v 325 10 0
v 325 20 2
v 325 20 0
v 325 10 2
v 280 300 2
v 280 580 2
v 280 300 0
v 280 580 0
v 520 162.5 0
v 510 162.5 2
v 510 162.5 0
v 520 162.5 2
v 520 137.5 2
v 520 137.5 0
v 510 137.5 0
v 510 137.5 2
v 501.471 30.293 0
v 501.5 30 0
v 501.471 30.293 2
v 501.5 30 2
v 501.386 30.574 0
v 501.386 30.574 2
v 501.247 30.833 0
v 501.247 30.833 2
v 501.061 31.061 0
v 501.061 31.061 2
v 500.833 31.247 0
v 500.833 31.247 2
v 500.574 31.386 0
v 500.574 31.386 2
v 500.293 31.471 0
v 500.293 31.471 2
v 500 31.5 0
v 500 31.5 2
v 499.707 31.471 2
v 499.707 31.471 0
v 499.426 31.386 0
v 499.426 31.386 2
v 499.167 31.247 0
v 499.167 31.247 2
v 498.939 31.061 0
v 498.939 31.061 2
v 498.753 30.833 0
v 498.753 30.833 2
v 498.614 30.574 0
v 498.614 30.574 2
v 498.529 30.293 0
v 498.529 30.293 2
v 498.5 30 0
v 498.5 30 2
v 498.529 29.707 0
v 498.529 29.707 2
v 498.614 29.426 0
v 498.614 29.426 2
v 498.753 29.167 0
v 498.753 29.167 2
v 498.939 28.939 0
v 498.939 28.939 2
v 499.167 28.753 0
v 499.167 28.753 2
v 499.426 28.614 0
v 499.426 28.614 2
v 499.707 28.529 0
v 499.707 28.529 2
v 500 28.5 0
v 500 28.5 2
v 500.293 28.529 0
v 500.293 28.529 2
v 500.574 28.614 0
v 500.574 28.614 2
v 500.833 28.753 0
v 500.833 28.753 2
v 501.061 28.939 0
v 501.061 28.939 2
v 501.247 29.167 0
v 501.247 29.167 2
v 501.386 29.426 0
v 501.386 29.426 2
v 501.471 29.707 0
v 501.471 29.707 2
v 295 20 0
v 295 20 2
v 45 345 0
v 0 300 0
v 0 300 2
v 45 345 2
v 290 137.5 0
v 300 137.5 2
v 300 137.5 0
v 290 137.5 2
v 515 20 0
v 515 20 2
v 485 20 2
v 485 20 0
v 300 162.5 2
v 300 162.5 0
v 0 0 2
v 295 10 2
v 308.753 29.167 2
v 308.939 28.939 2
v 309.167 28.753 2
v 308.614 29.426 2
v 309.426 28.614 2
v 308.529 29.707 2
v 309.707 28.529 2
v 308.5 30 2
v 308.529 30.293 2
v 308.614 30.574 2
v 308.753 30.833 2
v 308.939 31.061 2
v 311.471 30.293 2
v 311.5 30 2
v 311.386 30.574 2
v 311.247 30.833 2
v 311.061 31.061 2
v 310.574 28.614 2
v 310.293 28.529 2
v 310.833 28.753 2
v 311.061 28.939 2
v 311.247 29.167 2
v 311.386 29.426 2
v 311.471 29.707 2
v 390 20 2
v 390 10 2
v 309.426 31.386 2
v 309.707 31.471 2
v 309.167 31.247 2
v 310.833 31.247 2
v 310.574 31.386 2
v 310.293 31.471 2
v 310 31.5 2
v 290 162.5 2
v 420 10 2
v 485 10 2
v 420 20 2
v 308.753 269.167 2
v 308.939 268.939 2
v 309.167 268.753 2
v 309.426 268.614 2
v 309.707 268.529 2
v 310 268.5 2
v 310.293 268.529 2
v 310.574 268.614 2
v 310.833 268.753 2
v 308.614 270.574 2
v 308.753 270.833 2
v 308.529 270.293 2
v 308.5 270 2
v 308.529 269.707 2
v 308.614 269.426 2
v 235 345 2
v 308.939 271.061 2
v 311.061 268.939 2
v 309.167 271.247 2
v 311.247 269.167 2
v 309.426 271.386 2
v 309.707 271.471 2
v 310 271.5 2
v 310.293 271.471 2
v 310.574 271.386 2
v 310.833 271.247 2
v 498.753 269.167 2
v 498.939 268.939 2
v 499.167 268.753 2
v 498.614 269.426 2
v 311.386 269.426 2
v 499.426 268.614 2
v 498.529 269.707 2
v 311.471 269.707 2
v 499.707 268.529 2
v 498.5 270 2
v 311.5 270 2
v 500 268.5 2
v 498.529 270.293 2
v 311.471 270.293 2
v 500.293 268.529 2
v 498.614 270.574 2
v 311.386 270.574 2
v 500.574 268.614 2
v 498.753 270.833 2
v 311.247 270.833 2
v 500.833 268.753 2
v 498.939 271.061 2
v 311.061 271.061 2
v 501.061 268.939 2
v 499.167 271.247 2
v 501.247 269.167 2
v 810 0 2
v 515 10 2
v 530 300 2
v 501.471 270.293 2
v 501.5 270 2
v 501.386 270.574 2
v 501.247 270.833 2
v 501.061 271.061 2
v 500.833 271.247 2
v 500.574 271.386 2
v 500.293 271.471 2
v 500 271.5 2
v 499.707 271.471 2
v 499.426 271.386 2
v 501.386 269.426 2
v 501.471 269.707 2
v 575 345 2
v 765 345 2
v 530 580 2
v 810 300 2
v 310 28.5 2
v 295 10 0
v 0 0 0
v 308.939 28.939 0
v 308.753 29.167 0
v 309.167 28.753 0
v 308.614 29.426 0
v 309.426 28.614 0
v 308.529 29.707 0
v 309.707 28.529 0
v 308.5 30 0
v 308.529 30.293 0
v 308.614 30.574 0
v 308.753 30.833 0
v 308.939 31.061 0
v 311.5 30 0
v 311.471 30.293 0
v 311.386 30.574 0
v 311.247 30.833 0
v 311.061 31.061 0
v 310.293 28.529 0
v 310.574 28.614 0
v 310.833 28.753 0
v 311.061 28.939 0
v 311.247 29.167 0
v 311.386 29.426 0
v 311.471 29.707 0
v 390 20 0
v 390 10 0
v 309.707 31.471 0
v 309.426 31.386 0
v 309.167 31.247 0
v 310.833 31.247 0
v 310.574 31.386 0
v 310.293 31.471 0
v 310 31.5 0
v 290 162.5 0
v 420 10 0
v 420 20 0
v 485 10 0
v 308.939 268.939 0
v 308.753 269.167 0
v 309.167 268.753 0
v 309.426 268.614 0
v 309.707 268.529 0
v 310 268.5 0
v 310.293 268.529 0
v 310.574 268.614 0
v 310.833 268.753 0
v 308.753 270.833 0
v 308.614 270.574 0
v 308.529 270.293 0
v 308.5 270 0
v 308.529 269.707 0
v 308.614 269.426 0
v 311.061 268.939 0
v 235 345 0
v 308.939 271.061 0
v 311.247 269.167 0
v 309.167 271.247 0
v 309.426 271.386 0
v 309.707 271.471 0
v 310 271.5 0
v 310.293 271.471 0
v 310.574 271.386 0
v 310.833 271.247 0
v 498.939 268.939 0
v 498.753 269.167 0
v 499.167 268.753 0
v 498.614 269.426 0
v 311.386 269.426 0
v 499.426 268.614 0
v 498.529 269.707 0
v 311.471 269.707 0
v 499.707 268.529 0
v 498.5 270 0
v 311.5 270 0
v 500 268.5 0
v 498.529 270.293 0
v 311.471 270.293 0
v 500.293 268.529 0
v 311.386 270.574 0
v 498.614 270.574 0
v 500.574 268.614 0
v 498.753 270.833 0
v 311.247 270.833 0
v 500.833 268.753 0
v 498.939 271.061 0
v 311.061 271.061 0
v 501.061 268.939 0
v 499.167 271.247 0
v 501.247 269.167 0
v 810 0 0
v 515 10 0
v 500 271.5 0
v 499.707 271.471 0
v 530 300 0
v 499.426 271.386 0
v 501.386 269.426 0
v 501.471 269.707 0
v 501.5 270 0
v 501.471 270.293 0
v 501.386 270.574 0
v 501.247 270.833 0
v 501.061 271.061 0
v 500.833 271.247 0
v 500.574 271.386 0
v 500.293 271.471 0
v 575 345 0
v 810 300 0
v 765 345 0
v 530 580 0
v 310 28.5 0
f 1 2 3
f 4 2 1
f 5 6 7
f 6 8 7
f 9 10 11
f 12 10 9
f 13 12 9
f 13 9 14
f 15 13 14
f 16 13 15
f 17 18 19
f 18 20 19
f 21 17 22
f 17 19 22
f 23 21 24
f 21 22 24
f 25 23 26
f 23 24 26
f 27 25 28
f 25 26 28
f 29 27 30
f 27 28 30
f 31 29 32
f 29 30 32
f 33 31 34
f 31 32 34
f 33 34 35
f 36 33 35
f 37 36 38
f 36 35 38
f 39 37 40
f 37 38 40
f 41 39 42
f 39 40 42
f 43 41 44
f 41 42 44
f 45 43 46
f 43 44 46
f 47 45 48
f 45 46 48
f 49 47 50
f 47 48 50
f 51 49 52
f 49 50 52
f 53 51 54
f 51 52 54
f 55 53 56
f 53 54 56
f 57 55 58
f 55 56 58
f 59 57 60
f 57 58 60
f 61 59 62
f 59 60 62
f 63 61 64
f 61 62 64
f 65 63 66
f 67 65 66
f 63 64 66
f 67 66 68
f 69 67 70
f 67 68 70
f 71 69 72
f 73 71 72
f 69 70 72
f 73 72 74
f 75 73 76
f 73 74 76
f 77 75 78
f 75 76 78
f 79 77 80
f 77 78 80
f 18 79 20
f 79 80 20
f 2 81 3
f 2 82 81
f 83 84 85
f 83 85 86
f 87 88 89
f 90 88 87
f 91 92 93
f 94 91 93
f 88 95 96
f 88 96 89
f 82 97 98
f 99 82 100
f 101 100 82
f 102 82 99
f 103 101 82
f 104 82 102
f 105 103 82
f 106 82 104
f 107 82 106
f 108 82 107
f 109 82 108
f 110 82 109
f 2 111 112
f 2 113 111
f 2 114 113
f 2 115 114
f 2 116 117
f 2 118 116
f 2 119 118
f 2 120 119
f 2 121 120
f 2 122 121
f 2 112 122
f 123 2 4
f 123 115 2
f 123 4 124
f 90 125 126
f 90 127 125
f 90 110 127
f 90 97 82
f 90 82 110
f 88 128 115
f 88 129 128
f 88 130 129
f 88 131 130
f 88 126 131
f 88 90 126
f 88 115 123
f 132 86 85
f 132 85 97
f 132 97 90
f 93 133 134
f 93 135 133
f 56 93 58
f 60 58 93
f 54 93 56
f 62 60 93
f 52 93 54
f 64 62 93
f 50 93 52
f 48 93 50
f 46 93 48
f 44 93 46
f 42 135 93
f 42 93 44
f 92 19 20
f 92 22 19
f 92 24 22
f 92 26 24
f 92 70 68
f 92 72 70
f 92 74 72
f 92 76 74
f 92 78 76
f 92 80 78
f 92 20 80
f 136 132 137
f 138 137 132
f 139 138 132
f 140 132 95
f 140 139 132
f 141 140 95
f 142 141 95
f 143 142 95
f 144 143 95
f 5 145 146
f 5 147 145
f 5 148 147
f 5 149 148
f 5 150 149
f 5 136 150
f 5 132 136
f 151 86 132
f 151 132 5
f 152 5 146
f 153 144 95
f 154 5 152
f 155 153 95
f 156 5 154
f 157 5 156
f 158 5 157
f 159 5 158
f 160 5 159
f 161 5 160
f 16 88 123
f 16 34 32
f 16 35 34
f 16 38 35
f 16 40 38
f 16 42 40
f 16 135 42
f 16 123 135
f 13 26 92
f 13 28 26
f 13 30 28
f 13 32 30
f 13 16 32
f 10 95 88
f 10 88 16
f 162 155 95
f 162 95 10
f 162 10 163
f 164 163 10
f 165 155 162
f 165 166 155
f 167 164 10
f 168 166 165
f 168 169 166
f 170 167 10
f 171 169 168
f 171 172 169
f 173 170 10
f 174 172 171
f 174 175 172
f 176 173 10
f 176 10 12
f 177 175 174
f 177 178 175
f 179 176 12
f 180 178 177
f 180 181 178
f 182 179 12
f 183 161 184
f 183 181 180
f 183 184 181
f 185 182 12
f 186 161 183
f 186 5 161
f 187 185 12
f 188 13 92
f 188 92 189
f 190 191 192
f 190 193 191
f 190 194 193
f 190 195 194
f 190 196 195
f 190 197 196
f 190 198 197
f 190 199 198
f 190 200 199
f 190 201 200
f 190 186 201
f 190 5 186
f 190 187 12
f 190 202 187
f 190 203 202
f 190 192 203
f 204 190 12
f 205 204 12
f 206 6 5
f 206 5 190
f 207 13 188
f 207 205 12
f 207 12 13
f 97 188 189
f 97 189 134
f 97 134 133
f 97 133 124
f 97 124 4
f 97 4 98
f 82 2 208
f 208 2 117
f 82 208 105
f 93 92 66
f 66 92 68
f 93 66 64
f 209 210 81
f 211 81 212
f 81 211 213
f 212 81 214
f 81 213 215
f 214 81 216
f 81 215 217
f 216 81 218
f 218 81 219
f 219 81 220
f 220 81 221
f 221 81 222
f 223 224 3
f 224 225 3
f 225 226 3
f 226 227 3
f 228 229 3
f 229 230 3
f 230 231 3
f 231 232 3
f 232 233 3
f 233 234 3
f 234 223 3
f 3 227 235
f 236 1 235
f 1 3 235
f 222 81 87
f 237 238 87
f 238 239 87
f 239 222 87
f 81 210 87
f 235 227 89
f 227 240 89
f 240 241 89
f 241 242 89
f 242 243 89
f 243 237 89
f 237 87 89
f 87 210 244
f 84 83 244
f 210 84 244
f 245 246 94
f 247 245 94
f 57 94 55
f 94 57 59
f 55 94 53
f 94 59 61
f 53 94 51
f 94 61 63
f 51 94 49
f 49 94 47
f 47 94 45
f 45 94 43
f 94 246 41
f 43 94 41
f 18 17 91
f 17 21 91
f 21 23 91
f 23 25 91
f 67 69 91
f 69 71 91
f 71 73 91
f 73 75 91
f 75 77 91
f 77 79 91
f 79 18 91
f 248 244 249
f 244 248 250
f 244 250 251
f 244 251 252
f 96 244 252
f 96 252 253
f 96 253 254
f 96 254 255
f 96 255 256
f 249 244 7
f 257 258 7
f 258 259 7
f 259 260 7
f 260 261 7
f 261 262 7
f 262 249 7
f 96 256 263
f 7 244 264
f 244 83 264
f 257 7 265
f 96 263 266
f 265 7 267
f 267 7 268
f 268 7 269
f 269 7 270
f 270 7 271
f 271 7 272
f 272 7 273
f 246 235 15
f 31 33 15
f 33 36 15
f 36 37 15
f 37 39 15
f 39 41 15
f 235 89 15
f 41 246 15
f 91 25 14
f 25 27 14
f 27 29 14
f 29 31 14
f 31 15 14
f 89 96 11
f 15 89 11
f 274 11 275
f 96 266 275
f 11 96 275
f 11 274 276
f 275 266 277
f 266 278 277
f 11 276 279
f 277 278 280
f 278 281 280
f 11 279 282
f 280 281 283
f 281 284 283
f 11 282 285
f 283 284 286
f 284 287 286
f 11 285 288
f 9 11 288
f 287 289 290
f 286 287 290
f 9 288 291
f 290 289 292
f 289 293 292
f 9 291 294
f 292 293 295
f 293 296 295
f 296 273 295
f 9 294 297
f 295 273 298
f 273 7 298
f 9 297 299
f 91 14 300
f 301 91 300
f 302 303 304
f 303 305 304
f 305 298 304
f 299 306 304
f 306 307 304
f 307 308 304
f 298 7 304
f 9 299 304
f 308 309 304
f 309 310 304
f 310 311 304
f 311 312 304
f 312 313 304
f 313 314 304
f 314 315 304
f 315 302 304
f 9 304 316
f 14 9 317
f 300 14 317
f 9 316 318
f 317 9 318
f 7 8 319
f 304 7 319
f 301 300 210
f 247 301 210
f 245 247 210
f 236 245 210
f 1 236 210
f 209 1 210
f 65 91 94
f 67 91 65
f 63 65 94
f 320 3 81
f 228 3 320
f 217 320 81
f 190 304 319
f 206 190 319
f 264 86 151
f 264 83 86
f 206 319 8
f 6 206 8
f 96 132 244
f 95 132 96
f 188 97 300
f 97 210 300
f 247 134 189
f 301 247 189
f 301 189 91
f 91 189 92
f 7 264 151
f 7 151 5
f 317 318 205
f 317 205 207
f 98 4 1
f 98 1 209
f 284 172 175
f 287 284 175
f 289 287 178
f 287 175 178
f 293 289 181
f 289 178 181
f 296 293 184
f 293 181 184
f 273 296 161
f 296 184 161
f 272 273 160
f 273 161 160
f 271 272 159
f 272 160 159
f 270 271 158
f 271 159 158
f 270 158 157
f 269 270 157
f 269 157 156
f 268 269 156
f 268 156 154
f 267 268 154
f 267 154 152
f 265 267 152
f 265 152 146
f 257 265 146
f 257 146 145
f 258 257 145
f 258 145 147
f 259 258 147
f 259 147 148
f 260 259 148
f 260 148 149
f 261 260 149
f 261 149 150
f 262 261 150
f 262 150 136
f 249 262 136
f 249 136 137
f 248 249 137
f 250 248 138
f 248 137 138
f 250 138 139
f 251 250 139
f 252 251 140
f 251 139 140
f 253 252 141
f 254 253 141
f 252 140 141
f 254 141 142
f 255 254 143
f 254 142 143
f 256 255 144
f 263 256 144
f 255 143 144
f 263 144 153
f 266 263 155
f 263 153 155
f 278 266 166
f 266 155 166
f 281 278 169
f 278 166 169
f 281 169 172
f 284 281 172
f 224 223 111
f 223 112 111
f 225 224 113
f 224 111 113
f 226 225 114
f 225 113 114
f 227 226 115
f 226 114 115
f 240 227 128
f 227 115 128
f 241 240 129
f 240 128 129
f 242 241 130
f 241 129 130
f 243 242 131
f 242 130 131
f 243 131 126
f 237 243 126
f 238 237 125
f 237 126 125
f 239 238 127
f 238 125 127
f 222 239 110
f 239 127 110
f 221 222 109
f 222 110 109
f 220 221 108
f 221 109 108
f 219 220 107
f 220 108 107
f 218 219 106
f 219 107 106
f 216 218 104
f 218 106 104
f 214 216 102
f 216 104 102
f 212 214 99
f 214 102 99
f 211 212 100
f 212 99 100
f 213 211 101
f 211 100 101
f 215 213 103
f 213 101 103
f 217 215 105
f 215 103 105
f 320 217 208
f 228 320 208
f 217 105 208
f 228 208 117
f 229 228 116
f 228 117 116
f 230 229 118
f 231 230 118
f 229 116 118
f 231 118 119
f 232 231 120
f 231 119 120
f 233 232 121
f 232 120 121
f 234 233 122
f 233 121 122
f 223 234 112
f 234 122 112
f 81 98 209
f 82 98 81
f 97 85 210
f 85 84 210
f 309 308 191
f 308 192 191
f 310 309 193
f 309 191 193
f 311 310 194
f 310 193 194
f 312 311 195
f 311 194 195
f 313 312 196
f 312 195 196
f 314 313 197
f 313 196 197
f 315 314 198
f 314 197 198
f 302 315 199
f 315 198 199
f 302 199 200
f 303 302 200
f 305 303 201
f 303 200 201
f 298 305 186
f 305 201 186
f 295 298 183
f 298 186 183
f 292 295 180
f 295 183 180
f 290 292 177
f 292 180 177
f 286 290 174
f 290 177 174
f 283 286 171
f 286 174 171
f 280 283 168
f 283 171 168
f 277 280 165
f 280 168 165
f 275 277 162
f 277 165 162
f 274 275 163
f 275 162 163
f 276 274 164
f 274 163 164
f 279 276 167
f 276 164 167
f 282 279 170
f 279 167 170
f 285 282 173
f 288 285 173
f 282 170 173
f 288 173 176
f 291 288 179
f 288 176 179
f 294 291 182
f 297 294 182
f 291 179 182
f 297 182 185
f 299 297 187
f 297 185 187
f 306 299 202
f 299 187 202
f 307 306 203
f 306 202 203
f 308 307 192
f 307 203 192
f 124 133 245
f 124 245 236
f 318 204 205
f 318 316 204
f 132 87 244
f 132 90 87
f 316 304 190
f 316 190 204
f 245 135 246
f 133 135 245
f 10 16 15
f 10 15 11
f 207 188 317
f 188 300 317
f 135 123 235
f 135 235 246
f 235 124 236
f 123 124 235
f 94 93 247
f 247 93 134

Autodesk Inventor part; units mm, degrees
ref_plane "YZ Plane" through (0, 0, 0) normal (1, 0, 0) x (0, 1, 0)
ref_plane "XZ Plane" through (0, 0, 0) normal (0, 1, 0) x (-1, 0, 0)
ref_plane "XY Plane" through (0, 0, 0) normal (0, 0, 1) x (1, 0, 0)
sketch "Эскиз1" plane through (0, 0, 0) normal (0, 0, 1) x (1, 0, 0)
  line L0 (0, 0) -> (810, 0)
  line L1 (810, 0) -> (810, 300)
  line L2 (810, 300) -> (0, 300)
  line L3 (0, 300) -> (0, 0)
  line L4 (280, 300) -> (530, 300) construction
  line L5 (530, 300) -> (530, 0) construction
  line L6 (530, 0) -> (280, 0) construction
  line L7 (280, 0) -> (280, 300) construction
  line L8 (280, 300) -> (530, 300)
  line L9 (530, 300) -> (530, 580)
  line L10 (530, 580) -> (280, 580)
  line L11 (280, 580) -> (280, 300)
  line L12 (0, 300) -> (45, 345)
  line L13 (45, 345) -> (235, 345)
  line L14 (235, 345) -> (280, 300)
  line L15 (530, 300) -> (575, 345)
  line L16 (575, 345) -> (765, 345)
  line L17 (765, 345) -> (810, 300)
  dimension "d0" = 300
  dimension "d1" = 810
  dimension "d2" = 250
  dimension "d3" = 280
  dimension "d4" = 280
  dimension "d5" = 280
  dimension "d6" = 45
extrude "Выдавливание1" add sketch "Эскиз1" along normal blind 2
sketch "Эскиз2" plane through (0, 0, 2) normal (0, 0, 1) x (1, 0, 0)
  line L0 (45, 345) -> (0, 300) projected
  line L1 (0, 300) -> (0, 0) projected
  line L2 (0, 0) -> (810, 0) projected
  line L3 (810, 0) -> (810, 300) projected
  line L4 (810, 300) -> (765, 345) projected
  line L5 (765, 345) -> (575, 345) projected
  line L6 (575, 345) -> (530, 300) projected
  line L7 (530, 300) -> (530, 580) projected
  line L8 (530, 580) -> (280, 580) projected
  line L9 (280, 580) -> (280, 300) projected
  line L10 (280, 300) -> (235, 345) projected
  line L11 (235, 345) -> (45, 345) projected
  line L12 (280, 300) -> (530, 300) construction
  line L13 (530, 300) -> (530, 0) construction
  line L14 (530, 0) -> (280, 0) construction
  line L15 (280, 0) -> (280, 300) construction
  line L16 (530, 300) -> (530, 580) construction
  circle A0 centre (310, 270) radius 1.5
  circle A1 centre (500, 270) radius 1.5
  circle A2 centre (310, 30) radius 1.5
  circle A3 centre (500, 30) radius 1.5
  line L17 (500, 270) -> (310, 270) construction
  line L18 (310, 270) -> (310, 30) construction
  line L19 (310, 30) -> (500, 30) construction
  line L20 (500, 30) -> (500, 270) construction
  line L21 (290, 162.5) -> (300, 162.5)
  line L22 (300, 162.5) -> (300, 137.5)
  line L23 (300, 137.5) -> (290, 137.5)
  line L24 (290, 137.5) -> (290, 162.5)
  line L25 (510, 162.5) -> (520, 162.5)
  line L26 (520, 162.5) -> (520, 137.5)
  line L27 (520, 137.5) -> (510, 137.5)
  line L28 (510, 137.5) -> (510, 162.5)
  line L29 (280, 150) -> (530, 150) construction
  line L30 (390, 20) -> (420, 20)
  line L31 (420, 20) -> (420, 10)
  line L32 (420, 10) -> (390, 10)
  line L33 (390, 10) -> (390, 20)
  line L34 (405, 300) -> (405, 0) construction
  line L35 (0, 0) -> (810, 0) construction
  line L36 (325, 10) -> (295, 10)
  line L37 (295, 10) -> (295, 20)
  line L38 (295, 20) -> (325, 20)
  line L39 (325, 20) -> (325, 10)
  line L40 (485, 10) -> (515, 10)
  line L41 (515, 10) -> (515, 20)
  line L42 (515, 20) -> (485, 20)
  line L43 (485, 20) -> (485, 10)
  point P0 (290, 150)
  point P1 (510, 150)
  point P2 (405, 20)
  dimension "d9" = 3
  dimension "d10" = 30
  dimension "d11" = 30
  dimension "d12" = 30
  dimension "d13" = 30
  dimension "d16" = 10
  dimension "d17" = 25
  dimension "d18" = 10
  dimension "d19" = 10
  dimension "d20" = 10
  dimension "d21" = 30
  dimension "d22" = 10
  dimension "d23" = 30
  dimension "d24" = 15
extrude "Выдавливание2" cut sketch "Эскиз2" against normal through all contours A0 | A1 | A2 | A3 | L21 L22 L23 L24 | L25 L26 L27 L28 | L30 L31 L32 L33 | L36 L37 L38 L39 | L43 L42 L41 L40
properties part number "head_without_face"
